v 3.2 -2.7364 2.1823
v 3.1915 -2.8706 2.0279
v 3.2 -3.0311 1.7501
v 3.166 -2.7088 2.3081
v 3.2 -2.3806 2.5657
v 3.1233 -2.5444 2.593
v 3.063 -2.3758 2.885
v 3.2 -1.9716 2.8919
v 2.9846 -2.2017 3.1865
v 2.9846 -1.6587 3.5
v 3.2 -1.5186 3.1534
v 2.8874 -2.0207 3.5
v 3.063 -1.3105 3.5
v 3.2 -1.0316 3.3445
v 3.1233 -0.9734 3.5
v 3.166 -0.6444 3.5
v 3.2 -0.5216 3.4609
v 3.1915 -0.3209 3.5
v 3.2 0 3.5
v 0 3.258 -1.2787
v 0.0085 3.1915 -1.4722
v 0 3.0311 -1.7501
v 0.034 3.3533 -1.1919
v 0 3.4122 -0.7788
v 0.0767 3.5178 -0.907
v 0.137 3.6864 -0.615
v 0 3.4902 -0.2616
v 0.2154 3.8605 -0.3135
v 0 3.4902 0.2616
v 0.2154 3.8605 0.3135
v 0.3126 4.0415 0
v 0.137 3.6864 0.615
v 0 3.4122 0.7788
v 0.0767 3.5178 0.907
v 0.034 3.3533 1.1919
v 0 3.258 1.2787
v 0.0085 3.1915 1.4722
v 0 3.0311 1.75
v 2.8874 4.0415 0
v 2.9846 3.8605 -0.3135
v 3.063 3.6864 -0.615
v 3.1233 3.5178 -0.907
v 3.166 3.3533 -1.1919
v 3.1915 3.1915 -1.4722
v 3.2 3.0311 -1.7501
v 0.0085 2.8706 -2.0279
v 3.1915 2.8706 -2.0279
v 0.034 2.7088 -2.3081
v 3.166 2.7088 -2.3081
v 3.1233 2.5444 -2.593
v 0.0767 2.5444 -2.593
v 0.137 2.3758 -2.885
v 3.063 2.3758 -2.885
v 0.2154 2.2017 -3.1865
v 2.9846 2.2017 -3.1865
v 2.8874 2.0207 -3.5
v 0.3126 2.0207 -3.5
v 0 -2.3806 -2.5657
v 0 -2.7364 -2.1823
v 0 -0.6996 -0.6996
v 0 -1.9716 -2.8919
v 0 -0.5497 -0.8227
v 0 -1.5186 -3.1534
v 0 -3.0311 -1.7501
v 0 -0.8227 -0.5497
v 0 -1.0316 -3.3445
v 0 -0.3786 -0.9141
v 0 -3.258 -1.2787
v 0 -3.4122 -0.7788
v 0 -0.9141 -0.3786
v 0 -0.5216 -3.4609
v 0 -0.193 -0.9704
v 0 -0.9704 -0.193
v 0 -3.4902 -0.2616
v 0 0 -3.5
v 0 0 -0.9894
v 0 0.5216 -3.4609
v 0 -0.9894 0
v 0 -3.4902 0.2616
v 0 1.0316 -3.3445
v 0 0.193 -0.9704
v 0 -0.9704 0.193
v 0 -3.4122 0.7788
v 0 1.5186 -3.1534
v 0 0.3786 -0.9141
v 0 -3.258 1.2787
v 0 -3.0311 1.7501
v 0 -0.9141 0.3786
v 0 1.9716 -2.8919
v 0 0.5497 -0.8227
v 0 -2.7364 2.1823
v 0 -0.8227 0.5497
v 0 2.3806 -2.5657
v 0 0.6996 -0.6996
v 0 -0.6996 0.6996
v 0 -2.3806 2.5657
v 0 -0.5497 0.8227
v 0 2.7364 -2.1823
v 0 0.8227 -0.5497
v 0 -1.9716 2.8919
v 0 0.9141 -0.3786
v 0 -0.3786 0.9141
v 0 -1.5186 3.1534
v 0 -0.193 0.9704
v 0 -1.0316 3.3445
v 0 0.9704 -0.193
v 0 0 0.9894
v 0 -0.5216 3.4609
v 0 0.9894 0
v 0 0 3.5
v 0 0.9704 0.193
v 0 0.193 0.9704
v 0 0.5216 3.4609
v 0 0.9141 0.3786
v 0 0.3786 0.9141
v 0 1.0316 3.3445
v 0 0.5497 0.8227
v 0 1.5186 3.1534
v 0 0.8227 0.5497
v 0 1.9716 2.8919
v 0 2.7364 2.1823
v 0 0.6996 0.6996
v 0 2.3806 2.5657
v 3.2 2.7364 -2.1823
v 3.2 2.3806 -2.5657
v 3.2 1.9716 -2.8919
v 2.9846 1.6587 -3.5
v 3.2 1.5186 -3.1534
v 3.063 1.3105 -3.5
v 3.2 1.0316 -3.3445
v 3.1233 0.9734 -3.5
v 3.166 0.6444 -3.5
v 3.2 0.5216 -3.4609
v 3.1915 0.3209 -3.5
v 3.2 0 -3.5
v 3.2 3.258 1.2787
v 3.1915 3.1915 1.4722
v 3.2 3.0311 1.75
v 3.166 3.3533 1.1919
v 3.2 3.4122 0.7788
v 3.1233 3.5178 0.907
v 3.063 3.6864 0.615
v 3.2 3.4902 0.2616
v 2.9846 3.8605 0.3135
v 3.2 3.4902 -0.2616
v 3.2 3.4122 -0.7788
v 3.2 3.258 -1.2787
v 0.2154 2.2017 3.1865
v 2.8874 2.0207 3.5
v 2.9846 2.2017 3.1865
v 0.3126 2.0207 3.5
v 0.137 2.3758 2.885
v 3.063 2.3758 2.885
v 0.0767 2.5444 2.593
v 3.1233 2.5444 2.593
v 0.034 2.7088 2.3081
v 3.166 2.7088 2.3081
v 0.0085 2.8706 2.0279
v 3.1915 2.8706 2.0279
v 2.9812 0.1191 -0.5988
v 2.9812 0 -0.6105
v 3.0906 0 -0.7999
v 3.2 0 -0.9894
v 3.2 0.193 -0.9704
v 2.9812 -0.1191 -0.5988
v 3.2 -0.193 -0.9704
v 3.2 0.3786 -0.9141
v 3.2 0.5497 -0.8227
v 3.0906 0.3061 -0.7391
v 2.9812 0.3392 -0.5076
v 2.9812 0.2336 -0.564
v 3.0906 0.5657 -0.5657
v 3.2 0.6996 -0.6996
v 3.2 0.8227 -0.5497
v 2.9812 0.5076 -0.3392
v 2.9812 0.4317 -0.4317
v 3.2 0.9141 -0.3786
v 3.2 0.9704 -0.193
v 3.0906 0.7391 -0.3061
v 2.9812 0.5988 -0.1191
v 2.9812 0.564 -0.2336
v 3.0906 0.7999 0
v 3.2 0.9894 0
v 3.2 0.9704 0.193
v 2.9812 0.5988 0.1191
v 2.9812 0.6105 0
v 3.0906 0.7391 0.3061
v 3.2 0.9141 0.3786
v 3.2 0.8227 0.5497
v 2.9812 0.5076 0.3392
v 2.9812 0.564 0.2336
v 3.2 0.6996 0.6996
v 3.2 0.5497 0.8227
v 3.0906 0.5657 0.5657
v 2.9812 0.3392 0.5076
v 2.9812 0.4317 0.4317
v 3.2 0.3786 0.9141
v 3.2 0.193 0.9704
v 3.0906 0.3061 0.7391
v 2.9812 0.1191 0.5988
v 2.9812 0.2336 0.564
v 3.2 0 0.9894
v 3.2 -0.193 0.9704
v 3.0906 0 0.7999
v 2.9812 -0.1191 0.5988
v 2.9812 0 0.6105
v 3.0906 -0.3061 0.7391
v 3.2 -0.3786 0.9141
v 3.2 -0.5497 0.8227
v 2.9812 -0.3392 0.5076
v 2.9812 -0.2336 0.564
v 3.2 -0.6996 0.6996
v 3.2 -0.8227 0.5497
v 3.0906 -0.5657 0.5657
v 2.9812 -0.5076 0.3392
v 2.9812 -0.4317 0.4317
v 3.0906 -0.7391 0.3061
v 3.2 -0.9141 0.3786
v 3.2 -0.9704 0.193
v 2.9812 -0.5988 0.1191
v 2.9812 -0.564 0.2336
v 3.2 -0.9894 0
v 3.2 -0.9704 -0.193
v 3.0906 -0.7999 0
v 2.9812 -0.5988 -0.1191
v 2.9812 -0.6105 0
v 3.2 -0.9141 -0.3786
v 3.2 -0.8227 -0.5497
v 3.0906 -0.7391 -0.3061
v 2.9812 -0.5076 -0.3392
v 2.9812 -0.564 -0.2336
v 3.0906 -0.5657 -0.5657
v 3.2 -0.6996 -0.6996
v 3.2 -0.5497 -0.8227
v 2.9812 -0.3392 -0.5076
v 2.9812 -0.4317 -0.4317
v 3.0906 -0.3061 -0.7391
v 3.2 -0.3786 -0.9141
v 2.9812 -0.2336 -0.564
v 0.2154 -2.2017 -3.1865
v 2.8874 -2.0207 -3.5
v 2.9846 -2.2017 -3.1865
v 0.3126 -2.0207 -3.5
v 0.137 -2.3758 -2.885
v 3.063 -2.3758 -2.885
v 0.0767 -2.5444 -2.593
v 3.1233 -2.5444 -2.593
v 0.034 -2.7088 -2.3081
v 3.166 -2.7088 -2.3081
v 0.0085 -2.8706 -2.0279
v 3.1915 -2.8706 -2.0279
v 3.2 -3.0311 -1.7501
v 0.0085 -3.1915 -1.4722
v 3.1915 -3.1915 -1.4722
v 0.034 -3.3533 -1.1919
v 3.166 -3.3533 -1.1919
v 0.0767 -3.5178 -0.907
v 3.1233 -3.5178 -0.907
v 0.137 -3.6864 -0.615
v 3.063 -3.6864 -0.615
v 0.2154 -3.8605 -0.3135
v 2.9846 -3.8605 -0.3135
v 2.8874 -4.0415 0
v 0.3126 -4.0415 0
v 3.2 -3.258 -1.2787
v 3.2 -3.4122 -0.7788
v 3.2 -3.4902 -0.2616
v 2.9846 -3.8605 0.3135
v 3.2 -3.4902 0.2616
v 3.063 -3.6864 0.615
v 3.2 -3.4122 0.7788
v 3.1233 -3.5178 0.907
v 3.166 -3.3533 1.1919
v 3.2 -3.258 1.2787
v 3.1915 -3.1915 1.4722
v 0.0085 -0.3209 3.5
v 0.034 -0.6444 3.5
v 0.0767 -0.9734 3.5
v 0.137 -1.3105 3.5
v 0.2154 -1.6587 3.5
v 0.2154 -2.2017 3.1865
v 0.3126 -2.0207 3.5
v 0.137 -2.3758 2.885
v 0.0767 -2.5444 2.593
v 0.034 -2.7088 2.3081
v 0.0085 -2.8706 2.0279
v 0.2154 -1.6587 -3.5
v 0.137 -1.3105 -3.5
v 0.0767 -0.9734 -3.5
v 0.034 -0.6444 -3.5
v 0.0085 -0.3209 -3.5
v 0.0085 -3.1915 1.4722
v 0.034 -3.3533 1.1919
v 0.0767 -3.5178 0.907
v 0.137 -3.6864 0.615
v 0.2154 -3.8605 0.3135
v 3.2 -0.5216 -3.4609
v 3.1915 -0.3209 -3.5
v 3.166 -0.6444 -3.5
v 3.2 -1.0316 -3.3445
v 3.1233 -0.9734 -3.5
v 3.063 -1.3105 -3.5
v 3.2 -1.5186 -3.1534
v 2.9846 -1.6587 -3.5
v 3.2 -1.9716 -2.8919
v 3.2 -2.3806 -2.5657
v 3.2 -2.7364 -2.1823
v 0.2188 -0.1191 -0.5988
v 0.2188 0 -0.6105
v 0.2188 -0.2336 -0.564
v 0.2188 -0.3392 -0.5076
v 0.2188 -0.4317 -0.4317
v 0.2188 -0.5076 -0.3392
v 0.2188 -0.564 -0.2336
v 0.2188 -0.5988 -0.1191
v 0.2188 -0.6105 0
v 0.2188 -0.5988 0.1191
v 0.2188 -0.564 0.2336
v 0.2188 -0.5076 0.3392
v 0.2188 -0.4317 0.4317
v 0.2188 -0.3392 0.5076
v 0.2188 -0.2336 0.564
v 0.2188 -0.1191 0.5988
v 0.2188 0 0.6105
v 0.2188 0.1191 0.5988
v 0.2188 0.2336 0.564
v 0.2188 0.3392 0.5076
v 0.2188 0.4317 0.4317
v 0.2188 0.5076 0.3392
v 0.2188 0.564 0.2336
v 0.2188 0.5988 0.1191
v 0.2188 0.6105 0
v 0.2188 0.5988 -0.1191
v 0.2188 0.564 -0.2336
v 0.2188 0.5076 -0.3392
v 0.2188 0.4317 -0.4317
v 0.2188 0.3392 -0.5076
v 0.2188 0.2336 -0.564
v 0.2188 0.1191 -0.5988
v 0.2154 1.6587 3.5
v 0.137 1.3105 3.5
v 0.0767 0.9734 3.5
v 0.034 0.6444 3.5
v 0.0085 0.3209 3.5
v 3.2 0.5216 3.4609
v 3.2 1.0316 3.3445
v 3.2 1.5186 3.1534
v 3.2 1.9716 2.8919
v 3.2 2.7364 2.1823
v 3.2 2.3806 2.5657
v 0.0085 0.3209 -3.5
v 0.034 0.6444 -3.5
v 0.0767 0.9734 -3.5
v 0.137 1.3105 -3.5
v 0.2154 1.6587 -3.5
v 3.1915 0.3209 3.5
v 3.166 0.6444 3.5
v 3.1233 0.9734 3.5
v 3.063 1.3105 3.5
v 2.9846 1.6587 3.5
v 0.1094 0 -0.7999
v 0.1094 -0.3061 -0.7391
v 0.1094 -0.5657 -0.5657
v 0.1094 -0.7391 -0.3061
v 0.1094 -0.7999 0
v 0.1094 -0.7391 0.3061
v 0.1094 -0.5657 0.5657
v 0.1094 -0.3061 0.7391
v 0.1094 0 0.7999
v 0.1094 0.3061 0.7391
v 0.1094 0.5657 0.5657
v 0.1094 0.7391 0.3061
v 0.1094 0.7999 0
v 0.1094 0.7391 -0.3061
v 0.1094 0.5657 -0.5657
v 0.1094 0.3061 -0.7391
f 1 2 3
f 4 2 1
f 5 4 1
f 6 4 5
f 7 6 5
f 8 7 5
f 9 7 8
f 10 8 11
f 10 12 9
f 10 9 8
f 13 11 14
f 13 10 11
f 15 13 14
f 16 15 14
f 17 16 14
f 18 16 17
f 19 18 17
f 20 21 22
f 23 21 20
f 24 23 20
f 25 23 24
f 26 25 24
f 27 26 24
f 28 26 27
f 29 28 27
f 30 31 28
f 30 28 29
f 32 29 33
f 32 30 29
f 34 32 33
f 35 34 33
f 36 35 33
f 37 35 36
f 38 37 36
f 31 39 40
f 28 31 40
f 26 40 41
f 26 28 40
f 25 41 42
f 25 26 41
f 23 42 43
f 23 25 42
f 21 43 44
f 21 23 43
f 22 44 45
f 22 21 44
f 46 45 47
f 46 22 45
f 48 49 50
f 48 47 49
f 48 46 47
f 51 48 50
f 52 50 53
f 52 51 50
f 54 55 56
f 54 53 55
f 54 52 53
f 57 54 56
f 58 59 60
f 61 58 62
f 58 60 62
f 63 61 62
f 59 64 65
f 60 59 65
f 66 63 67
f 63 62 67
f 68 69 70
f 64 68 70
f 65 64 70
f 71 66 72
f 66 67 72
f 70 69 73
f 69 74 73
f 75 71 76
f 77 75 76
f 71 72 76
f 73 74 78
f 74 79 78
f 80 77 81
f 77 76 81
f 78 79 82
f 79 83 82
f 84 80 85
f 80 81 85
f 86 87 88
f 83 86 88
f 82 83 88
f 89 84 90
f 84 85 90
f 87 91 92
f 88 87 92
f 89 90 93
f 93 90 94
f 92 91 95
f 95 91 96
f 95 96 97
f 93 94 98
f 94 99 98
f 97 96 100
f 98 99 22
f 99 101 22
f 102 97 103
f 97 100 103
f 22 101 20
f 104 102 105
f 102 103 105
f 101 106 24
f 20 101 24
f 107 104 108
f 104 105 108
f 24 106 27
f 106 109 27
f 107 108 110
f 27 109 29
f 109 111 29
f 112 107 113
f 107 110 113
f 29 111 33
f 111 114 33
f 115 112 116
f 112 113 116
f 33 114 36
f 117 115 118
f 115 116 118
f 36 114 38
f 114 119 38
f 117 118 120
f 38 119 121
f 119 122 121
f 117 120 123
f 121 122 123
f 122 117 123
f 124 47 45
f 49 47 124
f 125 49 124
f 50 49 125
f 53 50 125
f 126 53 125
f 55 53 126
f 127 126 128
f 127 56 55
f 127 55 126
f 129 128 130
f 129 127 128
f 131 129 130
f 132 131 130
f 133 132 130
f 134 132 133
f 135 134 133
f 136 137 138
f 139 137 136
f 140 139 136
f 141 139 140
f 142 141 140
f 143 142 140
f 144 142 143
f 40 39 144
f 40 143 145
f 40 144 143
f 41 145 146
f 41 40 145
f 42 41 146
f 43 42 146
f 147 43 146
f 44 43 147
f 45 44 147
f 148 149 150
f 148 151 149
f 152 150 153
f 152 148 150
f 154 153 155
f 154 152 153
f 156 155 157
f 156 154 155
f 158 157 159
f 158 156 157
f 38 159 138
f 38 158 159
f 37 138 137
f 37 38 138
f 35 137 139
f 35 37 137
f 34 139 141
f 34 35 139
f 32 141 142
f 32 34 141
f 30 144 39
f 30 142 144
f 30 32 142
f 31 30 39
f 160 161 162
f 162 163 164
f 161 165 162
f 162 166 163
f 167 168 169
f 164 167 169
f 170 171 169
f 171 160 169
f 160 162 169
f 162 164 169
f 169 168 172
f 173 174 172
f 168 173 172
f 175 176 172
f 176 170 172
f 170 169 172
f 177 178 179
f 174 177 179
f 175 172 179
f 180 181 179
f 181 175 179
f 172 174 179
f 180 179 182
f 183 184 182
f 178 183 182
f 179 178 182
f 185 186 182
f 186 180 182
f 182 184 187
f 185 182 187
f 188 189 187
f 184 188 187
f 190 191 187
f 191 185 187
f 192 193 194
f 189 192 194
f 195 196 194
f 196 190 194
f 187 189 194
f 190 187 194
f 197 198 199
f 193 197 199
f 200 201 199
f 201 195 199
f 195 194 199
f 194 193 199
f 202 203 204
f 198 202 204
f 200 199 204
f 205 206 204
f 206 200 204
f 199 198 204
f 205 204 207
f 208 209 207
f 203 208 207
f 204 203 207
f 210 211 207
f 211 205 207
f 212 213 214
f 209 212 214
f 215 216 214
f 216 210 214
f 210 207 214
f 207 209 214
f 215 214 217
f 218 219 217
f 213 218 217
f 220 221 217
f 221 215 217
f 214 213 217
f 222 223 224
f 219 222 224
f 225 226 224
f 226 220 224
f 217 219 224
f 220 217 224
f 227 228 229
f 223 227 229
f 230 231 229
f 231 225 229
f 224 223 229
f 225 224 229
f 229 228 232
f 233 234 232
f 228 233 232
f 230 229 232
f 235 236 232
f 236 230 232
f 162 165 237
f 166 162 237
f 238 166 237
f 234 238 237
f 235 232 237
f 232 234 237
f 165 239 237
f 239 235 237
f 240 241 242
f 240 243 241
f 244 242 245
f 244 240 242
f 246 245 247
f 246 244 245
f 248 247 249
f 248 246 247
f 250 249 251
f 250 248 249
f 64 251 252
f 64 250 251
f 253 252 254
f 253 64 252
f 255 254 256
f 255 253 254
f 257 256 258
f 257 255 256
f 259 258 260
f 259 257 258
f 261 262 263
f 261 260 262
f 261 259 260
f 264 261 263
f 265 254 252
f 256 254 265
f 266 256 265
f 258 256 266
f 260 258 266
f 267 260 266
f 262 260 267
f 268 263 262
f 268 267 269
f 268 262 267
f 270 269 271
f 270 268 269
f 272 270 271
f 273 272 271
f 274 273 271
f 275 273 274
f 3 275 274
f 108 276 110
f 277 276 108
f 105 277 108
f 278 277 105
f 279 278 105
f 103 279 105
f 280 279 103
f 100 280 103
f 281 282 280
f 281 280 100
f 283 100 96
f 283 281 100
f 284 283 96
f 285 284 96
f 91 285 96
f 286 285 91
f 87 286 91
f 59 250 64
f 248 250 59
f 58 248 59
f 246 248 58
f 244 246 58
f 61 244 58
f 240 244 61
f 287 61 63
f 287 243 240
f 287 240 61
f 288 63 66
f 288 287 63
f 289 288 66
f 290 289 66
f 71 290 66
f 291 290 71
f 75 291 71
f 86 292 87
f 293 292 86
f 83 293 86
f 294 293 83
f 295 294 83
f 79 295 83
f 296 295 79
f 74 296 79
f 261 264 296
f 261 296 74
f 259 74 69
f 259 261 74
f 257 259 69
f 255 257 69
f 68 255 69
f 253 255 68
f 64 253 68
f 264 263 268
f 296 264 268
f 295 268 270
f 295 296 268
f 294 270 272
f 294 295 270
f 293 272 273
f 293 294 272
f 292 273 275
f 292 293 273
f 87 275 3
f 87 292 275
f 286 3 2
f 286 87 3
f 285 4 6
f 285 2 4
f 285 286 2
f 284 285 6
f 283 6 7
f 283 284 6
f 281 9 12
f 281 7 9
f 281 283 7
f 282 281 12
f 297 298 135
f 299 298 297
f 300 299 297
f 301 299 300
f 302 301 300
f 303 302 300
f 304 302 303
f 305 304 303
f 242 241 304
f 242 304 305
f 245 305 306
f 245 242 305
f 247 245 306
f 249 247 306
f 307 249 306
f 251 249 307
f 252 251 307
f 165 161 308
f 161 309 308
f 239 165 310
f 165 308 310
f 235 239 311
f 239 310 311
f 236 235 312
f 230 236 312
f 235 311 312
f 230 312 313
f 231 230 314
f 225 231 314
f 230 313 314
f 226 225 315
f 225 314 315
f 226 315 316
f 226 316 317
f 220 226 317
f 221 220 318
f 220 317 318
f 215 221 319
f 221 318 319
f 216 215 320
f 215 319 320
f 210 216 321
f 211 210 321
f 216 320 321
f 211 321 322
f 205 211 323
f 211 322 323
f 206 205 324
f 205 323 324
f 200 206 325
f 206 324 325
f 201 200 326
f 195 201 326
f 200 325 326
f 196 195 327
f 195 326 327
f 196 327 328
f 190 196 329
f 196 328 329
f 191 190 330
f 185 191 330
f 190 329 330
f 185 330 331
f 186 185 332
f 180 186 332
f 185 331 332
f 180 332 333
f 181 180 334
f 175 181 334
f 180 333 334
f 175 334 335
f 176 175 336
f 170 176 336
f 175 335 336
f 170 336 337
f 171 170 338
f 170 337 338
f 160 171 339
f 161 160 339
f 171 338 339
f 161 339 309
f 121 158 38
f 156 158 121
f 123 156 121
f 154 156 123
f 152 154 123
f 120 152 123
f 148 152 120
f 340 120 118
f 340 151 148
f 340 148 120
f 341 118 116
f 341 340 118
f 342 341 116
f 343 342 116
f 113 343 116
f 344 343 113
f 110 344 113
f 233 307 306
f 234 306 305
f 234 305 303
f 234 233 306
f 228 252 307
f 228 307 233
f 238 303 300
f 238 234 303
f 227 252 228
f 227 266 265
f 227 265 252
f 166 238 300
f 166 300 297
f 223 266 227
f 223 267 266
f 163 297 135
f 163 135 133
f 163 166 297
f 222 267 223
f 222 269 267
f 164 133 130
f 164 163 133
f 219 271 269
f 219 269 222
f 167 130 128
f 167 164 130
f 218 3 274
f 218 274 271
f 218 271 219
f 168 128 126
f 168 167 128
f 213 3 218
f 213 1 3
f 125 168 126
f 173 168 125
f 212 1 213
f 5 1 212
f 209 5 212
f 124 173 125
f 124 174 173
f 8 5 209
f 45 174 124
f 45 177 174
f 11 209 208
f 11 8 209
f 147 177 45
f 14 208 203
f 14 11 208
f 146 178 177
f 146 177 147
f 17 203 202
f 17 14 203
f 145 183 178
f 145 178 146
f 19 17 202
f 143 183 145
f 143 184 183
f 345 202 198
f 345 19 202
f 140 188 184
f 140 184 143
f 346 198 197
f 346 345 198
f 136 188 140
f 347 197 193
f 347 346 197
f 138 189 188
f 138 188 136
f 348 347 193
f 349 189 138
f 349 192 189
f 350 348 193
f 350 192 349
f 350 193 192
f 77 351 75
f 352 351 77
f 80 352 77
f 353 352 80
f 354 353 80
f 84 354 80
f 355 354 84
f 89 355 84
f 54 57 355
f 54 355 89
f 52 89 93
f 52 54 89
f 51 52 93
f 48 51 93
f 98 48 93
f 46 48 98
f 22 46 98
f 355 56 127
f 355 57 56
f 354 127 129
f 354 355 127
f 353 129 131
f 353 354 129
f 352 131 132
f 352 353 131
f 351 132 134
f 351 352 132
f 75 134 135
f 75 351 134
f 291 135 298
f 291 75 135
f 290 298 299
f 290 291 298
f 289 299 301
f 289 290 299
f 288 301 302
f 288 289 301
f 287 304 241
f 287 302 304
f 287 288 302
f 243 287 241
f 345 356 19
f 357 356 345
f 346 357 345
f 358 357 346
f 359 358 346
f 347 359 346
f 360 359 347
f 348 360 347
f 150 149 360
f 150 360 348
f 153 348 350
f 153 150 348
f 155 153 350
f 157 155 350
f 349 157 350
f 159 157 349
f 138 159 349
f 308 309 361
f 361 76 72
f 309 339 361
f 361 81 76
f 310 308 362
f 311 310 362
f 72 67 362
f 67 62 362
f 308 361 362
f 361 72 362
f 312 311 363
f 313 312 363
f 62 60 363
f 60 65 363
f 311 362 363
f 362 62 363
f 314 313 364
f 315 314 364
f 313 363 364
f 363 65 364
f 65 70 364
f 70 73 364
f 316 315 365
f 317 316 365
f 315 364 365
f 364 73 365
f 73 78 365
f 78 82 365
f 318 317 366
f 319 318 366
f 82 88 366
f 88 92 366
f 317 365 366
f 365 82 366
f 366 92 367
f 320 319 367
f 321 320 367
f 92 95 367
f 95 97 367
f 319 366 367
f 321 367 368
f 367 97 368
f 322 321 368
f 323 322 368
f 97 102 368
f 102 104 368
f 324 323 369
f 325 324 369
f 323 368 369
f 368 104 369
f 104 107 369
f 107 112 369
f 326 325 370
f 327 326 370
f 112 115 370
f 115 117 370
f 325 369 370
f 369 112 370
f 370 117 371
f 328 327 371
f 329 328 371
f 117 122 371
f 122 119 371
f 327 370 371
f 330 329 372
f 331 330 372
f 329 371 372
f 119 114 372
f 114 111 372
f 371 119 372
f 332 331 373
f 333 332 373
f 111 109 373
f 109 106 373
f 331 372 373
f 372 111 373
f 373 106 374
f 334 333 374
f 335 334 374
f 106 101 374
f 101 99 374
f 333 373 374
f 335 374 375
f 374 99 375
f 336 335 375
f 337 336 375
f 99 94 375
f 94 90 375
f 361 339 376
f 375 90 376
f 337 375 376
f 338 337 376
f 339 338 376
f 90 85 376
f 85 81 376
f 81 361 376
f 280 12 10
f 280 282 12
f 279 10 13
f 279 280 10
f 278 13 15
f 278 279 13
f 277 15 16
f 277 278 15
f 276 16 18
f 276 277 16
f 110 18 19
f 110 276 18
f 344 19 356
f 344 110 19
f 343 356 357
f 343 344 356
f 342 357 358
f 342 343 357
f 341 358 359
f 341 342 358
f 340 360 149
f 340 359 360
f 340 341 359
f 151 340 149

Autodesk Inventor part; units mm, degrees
ref_plane "YZ Plane" through (0, 0, 0) normal (1, 0, 0) x (0, 1, 0)
ref_plane "XZ Plane" through (0, 0, 0) normal (0, 1, 0) x (-1, 0, 0)
sketch "Sketch1" plane through (0, 0, 0) normal (1, 0, 0) x (0, 1, 0)
  line L0 (-4.0415, 0) -> (-2.0207, 3.5)
  line L1 (-2.0207, 3.5) -> (2.0207, 3.5)
  line L2 (2.0207, 3.5) -> (4.0415, 0)
  line L3 (4.0415, 0) -> (2.0207, -3.5)
  line L4 (2.0207, -3.5) -> (-2.0207, -3.5)
  line L5 (-2.0207, -3.5) -> (-4.0415, 0)
  point P0 (0, 0)
  point P1 (0, 0)
  dimension "d0" = 8.0829
extrude "Body" add sketch "Sketch1" along normal blind 3.2
sketch "Sketch2" plane through (0, 0, 0) normal (0, 0, 1) x (1, 0, 0)
  line L0 (0, 2.0207) -> (0, 4.0415) projected
  line L1 (0, 4.0415) -> (3.2, 4.0415) projected
  line L2 (3.2, 2.0207) -> (3.2, 4.0415) projected
  line L3 (-0.16, 0) -> (0.96, 0) projected
  line L4 (0.3126, 4.0415) -> (0, 3.5)
  line L5 (2.8874, 4.0415) -> (3.2, 3.5)
  dimension "d3" = 30
  dimension "d4" = 30
  dimension "d5" = 7
  dimension "d6" = 7
revolve "Chamfer1" cut sketch "Sketch2" angle 360 about axis through (-10, 0, 0) along (1, 0, 0)
sketch "Sketch3" plane through (3.2, 0, 0) normal (1, 0, 0) x (0, 0, -1)
  arc A0 (-1.75, -3.0311) -> (1.75, -3.0311) centre (0, 0) ccw projected
hole "Thread" at (3.2, 0, 0) direction (-1, 0, 0) diameter 1.221 end through all thread size "M1.6x0.35" class "6H" standard "ANSI Metric M Profile"
chamfer "Chamfer2" distance 0.3789 angle 30 1 edges at (3.2, 0, 0.6105) measured on face at (3.2, 2.5226, -0.0245)
chamfer "Chamfer3" distance 0.3789 angle 30 1 edges at (0, 0, 0.6105) measured on face at (0, 2.5226, -0.0245)
ref_plane "Work Plane1" through (-7.9612, 0, 0) normal (0, -0.866, -0.5) x (1, 0, 0)
equation "\"d0\" = 1.1547 * SW"
equation "\"d1\" = KOH"
equation "\"d3\" = ANG1"
equation "\"d4\" = ANG2"
equation "\"d5\" = SW0"
equation "\"d6\" = SW01"
equation "\"d8\" = -0.5 * GD1 + 0.5 * NND"
equation "\"d40\" = -0.5 * GD1 + 0.5 * NND"
equation "\"d10\" = -0.5 * GD1 + 0.5 * NND"
equation "\"d41\" = -0.5 * GD1 + 0.5 * NND"
equation "\"ANG1\" = 30deg"
equation "\"ANG2\" = 30deg"
equation "\"NND\" = 4"
equation "\"KOH\" = 3.2"
equation "\"SW\" = 7"
equation "\"SW0\" = SW"
equation "\"SW01\" = SW"
equation "\"GUL\" = 0.541266 * PTC"
equation "\"WFT\" = 0.4"
equation "\"THREADDIA\" = 4"
equation "\"TOA\" = 30deg"
equation "\"PTC\" = 0.7"
equation "\"E0\" = 1.155 * SW"
equation "\"GAL\" = 0.541266 * PTC"
equation "\"GD1\" = 3.242228"
properties part number "AS 1112 - M4  Type 5" material "Steel, Mild"
